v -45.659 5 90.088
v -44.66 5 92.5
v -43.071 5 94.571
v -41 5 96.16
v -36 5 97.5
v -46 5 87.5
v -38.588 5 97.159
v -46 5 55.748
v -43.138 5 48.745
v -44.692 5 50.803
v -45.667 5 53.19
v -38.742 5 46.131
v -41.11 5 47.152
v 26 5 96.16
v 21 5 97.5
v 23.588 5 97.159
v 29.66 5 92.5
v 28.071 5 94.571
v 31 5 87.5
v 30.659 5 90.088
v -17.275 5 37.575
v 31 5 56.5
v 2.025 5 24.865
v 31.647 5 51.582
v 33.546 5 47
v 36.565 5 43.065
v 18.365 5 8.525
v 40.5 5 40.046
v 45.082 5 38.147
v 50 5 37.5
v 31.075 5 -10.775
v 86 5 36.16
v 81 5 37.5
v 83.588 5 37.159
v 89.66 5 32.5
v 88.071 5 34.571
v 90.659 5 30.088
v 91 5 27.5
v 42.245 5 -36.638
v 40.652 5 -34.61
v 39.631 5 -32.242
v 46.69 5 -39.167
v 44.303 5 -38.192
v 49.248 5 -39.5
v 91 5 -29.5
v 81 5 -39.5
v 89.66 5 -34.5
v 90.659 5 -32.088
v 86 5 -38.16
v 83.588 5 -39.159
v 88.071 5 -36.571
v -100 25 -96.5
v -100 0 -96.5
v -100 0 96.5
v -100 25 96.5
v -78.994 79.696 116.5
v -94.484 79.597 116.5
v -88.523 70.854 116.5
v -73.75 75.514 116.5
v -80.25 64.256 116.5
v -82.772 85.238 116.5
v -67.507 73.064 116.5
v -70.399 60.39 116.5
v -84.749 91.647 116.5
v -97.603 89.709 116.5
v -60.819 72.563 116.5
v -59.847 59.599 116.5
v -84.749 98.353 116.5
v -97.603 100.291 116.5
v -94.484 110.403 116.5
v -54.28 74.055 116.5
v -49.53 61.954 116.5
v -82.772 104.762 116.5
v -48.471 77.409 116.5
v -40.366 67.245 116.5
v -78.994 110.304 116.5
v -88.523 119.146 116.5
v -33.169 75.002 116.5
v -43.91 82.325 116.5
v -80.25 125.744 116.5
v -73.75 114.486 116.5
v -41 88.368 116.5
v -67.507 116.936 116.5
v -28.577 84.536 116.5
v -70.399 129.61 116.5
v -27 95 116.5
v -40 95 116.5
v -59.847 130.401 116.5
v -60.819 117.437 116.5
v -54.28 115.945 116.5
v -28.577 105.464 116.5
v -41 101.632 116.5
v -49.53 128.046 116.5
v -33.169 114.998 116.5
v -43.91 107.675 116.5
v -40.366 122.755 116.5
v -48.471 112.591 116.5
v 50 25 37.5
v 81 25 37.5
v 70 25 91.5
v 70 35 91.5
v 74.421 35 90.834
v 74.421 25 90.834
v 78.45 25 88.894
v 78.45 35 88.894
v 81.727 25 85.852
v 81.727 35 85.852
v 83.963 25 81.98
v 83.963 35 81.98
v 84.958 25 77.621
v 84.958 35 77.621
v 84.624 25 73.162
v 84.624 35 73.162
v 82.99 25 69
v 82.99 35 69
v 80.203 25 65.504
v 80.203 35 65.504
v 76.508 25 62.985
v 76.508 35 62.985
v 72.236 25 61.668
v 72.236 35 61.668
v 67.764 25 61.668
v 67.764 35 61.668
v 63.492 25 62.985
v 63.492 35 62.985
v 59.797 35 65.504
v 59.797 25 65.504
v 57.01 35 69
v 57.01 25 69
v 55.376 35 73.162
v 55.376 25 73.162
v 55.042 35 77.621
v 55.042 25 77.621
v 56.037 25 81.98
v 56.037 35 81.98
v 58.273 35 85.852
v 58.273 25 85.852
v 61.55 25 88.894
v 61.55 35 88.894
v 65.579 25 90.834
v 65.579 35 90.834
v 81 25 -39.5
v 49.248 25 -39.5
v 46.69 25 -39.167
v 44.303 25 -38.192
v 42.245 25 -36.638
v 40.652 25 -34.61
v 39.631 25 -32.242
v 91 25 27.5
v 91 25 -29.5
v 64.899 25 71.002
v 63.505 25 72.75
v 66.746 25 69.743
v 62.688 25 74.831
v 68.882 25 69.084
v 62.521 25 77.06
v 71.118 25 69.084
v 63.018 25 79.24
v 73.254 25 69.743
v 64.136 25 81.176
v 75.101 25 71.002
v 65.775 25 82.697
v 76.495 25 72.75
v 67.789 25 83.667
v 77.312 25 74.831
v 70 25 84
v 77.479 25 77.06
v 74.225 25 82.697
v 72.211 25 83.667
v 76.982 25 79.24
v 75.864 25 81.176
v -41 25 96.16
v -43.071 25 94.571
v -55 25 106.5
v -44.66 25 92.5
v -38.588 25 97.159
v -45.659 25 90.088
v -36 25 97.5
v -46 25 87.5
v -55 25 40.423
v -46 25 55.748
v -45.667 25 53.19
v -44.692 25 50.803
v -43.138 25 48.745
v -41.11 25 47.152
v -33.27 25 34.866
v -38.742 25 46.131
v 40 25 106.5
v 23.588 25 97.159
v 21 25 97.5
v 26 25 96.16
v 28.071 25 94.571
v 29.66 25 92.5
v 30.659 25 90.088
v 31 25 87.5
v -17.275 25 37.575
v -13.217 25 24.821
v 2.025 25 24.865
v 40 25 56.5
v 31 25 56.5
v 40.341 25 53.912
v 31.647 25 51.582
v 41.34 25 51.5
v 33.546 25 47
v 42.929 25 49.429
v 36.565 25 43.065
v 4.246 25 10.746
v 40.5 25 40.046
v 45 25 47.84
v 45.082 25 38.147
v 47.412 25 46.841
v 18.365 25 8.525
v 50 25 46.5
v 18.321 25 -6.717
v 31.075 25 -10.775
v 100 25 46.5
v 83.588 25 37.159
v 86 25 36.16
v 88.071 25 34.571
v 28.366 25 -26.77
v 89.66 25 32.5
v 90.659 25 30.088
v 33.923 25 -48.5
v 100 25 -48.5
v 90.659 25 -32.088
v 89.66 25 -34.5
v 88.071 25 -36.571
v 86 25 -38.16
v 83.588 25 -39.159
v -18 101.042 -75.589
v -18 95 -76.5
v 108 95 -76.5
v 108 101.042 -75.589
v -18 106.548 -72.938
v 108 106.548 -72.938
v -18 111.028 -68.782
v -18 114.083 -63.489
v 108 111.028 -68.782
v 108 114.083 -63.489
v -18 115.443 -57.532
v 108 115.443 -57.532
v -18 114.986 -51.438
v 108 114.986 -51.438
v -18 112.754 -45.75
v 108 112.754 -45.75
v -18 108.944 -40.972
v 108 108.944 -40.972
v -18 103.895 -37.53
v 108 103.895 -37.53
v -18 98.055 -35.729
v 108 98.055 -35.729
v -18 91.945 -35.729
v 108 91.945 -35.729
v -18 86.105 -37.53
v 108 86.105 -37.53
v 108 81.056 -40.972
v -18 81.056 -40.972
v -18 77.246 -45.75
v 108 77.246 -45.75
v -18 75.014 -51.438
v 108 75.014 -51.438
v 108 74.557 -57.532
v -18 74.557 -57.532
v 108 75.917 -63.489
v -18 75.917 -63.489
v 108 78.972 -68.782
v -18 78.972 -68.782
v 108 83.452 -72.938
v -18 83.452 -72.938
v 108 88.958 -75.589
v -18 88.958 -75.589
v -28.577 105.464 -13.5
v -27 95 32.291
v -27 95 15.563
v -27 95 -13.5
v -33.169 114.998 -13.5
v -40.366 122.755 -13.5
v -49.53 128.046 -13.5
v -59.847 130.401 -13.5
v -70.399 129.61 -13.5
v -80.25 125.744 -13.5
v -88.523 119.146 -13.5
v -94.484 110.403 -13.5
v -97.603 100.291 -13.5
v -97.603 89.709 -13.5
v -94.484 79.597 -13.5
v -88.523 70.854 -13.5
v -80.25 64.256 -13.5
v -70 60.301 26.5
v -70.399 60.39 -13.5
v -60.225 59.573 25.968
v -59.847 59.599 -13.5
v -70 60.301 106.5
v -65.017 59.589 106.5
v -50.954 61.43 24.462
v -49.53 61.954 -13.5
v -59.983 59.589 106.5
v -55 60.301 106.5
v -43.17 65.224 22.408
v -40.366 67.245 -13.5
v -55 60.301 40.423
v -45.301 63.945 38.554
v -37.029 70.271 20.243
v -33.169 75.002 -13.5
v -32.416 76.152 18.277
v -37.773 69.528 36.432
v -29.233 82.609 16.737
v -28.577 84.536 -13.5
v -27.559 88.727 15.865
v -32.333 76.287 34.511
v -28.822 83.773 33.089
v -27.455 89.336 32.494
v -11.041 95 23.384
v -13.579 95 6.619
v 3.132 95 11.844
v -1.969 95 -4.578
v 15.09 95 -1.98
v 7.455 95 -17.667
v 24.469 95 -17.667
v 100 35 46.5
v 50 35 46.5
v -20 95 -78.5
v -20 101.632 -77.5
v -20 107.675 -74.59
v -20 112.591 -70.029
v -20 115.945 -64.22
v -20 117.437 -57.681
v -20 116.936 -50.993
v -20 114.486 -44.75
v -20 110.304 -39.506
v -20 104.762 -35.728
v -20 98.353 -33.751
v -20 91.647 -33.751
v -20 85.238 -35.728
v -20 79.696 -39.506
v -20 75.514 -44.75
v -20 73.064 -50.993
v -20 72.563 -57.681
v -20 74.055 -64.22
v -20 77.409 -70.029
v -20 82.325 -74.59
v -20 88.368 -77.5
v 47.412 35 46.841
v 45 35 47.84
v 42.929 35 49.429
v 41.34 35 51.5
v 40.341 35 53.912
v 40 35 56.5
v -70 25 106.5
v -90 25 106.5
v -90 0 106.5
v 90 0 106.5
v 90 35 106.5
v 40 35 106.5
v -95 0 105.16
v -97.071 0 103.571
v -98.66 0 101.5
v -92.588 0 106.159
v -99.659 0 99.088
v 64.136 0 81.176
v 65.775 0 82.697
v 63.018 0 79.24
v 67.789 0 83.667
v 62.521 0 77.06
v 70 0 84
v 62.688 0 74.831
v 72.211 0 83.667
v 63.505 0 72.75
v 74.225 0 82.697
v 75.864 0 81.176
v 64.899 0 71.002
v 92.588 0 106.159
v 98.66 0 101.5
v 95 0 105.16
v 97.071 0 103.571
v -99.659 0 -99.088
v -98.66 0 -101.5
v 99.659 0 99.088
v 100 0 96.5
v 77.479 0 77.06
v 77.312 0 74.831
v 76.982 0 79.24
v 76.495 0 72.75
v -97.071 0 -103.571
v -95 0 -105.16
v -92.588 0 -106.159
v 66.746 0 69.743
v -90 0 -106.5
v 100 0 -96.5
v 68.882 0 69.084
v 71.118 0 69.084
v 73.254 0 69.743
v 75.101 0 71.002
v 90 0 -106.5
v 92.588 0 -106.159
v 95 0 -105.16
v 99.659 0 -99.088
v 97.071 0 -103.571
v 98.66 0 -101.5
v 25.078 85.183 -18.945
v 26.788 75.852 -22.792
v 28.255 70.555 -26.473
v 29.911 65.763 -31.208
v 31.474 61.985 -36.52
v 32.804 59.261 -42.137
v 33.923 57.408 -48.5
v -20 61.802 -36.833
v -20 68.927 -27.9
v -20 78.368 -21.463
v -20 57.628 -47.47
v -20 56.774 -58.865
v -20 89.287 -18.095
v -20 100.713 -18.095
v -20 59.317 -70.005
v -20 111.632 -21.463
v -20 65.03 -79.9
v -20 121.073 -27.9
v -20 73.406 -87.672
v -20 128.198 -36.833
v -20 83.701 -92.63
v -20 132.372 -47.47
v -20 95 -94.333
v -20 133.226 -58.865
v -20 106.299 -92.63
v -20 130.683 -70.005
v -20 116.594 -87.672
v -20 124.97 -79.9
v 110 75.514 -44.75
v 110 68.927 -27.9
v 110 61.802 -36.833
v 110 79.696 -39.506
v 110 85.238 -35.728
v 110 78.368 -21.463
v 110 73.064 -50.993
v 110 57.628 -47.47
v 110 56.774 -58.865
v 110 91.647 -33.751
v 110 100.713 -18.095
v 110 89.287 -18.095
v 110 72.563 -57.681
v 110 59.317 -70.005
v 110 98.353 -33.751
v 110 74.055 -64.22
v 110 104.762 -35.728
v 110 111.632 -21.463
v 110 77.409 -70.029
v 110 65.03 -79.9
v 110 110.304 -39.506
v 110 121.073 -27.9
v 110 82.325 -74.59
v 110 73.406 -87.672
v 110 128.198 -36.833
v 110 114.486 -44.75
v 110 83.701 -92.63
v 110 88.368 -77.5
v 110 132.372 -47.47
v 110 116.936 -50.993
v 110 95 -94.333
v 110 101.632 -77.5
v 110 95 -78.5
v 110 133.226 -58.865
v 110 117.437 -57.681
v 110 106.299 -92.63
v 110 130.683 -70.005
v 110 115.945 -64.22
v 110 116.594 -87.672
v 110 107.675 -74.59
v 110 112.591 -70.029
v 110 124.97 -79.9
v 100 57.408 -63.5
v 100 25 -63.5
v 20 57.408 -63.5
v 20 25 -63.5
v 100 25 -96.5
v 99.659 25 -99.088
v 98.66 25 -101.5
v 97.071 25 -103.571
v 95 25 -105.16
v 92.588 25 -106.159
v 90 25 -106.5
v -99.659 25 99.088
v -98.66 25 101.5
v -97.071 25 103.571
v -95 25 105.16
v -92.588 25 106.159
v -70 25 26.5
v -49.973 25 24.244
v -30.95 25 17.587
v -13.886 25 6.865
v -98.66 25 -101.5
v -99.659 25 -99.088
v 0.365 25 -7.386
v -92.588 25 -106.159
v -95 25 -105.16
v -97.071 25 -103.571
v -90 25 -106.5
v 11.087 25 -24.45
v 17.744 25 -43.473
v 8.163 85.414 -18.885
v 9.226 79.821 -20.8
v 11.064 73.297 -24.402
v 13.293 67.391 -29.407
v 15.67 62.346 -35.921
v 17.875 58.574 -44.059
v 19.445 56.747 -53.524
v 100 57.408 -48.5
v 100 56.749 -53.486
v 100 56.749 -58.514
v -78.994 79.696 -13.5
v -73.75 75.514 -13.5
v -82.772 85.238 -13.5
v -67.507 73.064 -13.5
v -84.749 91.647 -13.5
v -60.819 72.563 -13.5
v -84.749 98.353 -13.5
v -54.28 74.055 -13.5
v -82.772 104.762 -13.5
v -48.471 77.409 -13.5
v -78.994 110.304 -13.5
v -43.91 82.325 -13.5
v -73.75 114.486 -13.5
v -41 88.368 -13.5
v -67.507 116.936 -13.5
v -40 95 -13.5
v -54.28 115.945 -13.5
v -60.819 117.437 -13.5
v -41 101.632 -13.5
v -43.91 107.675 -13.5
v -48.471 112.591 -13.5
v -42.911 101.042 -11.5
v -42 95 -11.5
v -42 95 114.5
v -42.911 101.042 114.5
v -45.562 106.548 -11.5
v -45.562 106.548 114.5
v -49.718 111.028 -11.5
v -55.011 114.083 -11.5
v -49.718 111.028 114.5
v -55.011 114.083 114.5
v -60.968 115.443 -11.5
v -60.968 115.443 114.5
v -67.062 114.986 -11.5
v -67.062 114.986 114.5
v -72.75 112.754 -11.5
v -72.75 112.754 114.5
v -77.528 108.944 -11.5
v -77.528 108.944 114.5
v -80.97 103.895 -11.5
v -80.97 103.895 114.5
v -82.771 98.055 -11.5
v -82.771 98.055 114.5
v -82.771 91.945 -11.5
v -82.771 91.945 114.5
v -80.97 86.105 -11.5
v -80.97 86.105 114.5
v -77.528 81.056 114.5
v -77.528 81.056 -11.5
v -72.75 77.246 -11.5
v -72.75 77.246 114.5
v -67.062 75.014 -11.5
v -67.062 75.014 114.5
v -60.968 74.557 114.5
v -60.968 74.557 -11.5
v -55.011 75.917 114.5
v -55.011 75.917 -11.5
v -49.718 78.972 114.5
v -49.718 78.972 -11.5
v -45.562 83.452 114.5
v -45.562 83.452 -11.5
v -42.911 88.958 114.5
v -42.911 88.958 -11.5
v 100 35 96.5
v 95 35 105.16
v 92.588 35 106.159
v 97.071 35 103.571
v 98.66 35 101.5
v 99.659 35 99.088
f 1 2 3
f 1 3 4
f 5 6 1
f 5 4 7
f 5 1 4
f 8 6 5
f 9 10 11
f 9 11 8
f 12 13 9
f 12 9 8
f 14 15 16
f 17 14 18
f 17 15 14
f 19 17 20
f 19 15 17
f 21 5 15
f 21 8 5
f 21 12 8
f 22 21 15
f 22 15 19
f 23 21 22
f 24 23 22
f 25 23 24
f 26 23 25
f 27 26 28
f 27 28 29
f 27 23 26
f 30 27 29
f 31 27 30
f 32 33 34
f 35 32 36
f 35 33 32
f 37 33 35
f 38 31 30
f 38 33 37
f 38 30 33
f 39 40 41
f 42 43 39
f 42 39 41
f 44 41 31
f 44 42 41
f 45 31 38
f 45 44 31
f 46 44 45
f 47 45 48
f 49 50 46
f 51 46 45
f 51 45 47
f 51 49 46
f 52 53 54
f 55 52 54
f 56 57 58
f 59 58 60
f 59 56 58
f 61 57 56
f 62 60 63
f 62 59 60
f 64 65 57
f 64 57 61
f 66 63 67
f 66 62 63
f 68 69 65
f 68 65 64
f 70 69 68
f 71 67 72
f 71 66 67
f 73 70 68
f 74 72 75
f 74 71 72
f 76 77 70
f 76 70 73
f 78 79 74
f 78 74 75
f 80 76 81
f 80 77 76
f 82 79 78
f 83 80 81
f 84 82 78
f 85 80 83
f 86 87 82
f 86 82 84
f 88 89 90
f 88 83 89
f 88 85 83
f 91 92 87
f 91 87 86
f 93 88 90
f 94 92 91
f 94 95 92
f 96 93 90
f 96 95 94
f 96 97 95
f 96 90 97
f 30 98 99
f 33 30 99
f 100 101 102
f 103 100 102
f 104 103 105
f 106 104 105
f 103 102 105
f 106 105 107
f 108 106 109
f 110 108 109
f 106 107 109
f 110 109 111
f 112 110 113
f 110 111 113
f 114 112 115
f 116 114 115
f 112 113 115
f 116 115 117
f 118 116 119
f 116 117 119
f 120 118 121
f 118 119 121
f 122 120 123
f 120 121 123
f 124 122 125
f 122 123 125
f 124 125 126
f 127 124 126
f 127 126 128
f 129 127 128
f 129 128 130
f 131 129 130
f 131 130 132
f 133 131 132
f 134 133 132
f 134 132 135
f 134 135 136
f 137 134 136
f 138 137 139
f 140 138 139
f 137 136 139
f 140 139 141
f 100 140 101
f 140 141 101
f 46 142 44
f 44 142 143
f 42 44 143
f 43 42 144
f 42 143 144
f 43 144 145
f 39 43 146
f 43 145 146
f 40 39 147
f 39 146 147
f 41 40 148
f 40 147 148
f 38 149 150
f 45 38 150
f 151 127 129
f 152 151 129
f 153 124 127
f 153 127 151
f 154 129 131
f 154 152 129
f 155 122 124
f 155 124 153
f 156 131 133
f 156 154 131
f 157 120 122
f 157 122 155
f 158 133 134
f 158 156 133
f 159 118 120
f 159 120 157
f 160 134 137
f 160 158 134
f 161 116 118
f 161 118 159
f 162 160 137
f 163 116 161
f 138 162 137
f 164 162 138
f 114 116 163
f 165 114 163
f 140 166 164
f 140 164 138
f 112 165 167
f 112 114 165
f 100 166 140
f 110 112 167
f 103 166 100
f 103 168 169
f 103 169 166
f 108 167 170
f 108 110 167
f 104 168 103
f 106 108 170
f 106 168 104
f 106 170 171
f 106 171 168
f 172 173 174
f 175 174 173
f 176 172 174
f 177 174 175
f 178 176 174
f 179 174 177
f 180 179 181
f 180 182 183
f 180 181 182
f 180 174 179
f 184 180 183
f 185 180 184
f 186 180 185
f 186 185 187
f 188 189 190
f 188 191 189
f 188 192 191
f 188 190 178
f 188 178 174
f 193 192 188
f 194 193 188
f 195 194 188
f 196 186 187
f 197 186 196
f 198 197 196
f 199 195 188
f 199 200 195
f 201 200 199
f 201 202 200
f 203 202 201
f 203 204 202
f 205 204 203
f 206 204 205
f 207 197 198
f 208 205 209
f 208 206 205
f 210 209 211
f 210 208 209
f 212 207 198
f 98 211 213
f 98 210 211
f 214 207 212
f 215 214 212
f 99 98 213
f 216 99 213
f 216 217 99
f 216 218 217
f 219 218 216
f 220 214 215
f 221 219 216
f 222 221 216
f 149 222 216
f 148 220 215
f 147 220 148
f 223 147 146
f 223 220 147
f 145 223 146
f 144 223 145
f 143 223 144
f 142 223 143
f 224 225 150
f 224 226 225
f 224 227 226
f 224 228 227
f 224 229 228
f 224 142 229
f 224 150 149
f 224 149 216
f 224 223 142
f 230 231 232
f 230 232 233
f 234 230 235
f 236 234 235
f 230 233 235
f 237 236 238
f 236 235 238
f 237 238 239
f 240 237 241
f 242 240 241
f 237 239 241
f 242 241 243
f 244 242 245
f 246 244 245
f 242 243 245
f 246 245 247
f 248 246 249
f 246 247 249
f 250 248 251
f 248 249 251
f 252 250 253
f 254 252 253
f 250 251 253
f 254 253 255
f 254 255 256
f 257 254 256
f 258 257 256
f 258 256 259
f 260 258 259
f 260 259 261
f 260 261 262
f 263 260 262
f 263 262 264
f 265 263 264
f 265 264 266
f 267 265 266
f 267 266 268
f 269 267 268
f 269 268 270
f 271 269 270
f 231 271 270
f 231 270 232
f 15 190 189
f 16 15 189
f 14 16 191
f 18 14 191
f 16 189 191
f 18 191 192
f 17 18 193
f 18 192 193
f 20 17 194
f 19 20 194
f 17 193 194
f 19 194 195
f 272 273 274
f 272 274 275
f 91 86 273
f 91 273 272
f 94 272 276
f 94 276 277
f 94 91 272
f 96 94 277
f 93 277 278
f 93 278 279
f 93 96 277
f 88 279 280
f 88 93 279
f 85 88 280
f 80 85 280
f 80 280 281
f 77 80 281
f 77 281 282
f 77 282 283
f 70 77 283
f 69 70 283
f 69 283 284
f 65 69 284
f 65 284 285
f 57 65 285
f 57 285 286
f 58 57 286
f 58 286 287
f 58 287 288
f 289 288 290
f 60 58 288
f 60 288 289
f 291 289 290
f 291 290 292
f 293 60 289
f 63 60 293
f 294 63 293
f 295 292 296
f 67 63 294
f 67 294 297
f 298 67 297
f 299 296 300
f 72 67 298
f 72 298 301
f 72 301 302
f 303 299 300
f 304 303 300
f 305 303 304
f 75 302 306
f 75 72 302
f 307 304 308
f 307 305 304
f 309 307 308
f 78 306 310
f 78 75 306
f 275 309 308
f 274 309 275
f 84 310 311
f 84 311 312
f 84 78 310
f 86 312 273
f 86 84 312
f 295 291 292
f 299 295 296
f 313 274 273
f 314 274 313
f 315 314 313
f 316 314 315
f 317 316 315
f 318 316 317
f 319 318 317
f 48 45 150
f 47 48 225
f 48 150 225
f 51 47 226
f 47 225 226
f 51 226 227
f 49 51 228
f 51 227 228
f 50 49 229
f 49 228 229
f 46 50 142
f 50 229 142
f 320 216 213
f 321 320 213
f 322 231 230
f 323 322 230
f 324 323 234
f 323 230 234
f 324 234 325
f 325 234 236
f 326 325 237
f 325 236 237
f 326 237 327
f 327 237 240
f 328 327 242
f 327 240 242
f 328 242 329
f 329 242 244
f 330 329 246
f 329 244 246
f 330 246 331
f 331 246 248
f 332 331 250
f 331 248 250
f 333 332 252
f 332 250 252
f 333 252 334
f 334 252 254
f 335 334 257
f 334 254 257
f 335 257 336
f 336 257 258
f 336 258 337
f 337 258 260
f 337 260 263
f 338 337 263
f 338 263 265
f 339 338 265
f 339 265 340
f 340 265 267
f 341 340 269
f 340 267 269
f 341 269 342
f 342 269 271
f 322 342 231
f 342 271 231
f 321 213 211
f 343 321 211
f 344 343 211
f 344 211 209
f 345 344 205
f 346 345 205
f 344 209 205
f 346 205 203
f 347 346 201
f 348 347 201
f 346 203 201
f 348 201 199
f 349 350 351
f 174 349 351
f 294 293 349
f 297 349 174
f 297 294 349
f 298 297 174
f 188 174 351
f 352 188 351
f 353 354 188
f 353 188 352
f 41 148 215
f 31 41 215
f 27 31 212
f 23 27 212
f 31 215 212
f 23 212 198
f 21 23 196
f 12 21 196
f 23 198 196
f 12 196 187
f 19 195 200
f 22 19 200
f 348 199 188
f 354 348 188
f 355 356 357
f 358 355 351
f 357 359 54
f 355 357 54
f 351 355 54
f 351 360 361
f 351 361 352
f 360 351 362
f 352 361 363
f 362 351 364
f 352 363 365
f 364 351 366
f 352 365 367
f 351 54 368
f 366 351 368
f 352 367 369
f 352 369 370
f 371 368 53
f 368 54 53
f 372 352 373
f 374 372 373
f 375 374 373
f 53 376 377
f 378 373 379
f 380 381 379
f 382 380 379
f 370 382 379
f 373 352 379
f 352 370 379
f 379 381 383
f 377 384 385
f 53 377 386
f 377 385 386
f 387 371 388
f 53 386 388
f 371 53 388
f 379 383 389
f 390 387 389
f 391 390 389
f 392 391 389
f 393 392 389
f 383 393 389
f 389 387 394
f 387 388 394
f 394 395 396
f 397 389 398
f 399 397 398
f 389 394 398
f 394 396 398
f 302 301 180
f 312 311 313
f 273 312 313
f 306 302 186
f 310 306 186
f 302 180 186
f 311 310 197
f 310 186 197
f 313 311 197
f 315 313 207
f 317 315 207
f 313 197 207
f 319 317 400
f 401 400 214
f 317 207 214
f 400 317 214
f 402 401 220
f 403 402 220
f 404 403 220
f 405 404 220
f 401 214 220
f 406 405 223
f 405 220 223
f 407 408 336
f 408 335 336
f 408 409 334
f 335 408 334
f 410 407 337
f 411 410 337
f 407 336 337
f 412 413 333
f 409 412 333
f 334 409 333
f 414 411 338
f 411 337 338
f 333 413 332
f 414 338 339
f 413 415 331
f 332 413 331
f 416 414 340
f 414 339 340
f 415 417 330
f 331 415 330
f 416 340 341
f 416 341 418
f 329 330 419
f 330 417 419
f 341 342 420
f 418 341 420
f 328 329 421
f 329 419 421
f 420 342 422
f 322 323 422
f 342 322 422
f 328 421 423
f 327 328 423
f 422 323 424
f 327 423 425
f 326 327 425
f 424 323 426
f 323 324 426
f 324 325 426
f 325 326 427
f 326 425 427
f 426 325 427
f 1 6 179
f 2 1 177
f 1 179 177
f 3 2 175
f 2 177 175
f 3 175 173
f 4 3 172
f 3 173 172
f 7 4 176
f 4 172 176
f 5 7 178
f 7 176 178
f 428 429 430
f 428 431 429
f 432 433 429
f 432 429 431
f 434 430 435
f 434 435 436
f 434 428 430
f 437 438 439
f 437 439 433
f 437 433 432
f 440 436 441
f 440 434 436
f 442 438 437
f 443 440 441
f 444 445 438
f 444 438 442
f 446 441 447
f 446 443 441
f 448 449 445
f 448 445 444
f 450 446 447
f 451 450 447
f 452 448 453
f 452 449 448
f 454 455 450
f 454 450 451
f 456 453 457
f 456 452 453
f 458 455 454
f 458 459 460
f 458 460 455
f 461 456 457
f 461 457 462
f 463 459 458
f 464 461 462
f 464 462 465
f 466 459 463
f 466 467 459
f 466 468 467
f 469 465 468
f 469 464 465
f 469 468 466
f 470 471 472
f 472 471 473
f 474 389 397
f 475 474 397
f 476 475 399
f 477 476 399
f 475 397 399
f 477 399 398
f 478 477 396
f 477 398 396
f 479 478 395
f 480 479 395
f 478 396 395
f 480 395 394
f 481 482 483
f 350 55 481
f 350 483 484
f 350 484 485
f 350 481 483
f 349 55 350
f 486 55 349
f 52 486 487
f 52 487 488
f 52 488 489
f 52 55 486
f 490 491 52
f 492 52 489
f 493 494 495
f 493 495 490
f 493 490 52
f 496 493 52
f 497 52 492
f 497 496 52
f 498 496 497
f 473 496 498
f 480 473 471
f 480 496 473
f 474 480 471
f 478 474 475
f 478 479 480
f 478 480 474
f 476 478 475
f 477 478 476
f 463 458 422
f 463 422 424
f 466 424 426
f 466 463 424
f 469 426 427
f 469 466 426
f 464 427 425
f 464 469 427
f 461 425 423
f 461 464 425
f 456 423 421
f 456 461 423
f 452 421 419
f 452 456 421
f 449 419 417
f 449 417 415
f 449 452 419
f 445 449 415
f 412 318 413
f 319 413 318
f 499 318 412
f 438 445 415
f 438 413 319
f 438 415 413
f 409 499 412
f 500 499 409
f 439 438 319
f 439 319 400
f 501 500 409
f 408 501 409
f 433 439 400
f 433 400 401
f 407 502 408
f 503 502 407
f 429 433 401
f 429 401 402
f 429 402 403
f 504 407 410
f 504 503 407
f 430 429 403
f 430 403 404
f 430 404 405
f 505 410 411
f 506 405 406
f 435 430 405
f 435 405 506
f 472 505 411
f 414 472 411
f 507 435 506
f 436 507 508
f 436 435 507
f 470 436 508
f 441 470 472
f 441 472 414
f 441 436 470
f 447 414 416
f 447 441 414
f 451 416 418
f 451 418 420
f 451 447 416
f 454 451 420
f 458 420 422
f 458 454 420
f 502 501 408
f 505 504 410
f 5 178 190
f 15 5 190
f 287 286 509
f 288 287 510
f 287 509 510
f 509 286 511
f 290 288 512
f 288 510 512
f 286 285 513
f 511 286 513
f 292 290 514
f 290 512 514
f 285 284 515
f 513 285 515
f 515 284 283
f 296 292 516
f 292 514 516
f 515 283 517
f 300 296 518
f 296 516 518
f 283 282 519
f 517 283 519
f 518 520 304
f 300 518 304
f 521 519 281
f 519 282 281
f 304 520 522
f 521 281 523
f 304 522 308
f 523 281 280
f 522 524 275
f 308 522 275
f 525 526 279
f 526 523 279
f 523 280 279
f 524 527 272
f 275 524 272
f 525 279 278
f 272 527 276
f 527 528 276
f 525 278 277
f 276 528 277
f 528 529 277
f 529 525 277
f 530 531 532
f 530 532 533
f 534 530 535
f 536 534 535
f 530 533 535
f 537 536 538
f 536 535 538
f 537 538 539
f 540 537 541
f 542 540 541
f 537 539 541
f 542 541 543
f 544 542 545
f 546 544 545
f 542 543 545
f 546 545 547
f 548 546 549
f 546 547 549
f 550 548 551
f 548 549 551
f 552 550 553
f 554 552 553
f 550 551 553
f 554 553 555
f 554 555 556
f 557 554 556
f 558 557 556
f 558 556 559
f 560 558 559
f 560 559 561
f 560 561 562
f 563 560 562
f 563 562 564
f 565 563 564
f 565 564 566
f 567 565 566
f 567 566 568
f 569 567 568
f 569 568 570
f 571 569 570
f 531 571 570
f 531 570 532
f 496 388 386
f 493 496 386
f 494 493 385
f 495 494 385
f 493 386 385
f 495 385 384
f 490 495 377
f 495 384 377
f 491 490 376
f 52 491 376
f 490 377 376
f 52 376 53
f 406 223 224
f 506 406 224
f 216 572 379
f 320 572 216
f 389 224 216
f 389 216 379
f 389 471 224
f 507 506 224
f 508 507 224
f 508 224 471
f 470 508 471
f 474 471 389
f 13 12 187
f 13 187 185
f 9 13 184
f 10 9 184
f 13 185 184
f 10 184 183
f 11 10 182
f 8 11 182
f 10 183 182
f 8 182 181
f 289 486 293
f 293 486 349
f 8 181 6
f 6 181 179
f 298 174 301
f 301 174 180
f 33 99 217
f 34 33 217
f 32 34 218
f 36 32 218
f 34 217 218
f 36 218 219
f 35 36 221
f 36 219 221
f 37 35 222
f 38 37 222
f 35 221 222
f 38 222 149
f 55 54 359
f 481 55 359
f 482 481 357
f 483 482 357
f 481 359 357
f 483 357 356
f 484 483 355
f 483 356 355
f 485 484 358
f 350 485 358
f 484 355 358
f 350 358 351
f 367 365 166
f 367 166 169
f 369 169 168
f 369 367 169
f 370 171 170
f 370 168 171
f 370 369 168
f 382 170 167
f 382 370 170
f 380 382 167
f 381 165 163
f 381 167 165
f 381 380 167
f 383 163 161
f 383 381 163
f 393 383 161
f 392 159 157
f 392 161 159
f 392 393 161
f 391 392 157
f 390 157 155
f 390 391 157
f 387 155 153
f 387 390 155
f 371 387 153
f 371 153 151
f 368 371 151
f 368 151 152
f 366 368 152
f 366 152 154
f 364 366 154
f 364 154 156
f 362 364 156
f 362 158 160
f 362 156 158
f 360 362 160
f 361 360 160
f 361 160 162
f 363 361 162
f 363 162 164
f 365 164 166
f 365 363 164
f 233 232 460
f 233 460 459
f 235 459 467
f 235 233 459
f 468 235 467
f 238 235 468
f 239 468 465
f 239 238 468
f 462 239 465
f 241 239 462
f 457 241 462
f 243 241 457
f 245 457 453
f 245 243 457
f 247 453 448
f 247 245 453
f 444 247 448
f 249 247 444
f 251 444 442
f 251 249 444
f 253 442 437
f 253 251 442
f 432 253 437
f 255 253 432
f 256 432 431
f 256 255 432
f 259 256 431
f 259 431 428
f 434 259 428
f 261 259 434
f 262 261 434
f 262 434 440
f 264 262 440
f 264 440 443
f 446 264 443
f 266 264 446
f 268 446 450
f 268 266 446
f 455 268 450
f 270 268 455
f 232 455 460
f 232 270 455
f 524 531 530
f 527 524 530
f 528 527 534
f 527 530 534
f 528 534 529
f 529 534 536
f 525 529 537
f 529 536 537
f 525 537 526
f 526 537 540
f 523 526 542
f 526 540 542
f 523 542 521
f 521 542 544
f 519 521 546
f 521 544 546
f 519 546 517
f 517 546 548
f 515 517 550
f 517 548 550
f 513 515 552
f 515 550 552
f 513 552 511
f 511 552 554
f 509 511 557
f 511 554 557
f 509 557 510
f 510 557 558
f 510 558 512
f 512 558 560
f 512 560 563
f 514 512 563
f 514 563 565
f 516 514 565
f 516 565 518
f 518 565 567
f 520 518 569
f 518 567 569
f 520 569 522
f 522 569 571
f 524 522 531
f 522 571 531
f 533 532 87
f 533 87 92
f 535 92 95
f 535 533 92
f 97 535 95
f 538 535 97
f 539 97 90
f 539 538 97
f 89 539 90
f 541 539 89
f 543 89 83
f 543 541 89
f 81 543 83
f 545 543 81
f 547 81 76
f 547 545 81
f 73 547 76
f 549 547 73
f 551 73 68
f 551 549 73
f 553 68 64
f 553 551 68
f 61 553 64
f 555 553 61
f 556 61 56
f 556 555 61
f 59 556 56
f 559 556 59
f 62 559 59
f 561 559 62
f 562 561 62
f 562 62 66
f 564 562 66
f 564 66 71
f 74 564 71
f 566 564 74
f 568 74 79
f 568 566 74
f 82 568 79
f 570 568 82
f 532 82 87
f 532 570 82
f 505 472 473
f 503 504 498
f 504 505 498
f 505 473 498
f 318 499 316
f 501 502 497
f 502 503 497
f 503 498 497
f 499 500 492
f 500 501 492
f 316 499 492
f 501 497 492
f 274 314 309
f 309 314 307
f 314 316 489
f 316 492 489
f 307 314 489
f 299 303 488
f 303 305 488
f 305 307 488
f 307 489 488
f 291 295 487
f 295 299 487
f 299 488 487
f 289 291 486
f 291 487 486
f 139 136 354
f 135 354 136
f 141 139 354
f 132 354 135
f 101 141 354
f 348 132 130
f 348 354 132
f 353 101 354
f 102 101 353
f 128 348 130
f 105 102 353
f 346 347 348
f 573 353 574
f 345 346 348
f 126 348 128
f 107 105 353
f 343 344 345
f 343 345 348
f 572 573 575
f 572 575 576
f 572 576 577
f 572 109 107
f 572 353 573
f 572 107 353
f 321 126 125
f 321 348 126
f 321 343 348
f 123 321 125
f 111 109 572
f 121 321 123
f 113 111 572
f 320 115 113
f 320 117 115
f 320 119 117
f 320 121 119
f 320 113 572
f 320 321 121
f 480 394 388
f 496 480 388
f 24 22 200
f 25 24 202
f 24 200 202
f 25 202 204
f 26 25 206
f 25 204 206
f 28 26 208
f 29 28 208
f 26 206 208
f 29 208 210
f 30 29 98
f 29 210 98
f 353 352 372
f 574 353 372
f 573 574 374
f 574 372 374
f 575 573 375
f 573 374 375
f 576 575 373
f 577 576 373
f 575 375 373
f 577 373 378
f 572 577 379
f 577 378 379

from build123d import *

# Parameters (mm, degrees)
BOSS_EXTRUDE1_DEPTH     = 95
BOSS_EXTRUDE2_DEPTH     = 25
BOSS_EXTRUDE3_DEPTH     = 35
CUT_EXTRUDE1_DEPTH      = 20
SKETCH4_R               = 38.333333333
SKETCH4_R_2             = 20.5
BOSS_EXTRUDE4_DEPTH     = 120
SKETCH5_R               = 35.5
SKETCH5_R_2             = 20.5
BOSS_EXTRUDE5_DEPTH     = 120
BOSS_EXTRUDE6_START     = 10
SKETCH6_R               = 35.5
SKETCH6_R_2             = 20.5
BOSS_EXTRUDE6_DEPTH     = 10
BOSS_EXTRUDE7_START     = 10
SKETCH7_R               = 38.333333333
SKETCH7_R_2             = 20.5
BOSS_EXTRUDE7_DEPTH     = 10
SKETCH8_R               = 20.5
CUT_EXTRUDE2_DEPTH      = 283.146731022
SKETCH9_R               = 20.5
CUT_EXTRUDE3_DEPTH      = 275.681684551
SKETCH10_R              = 15
CUT_EXTRUDE4_DEPTH      = 10
CUT_EXTRUDE5_DEPTH      = 194.412412161
CUT_EXTRUDE5_DEPTH_BACK = 194.412412161
SKETCH11_R              = 7.5
CHAMFER1_SIZE           = 2


with BuildPart() as part:
    # Sketch1 → Boss-Extrude1 (new body)
    with BuildSketch(Plane(origin=(0, 0, 0), x_dir=(1, 0, 0), z_dir=(0, 1, 0))):
        with BuildLine():
            Line((-70, -26.5), (-70, -106.5))
            Line((-70, -106.5), (-55, -106.5))
            Line((-55, -106.5), (-55, -40.423048454))
            ThreePointArc((-55, -40.423048454), (4.246212025, -10.746212025), (33.923048454, 48.5))
            Line((33.923048454, 48.5), (100, 48.5))
            Line((100, 48.5), (100, 63.5))
            Line((100, 63.5), (20, 63.5))
            ThreePointArc((20, 63.5), (-6.360389693, -0.139610307), (-70, -26.5))
        make_face()
    extrude(amount=BOSS_EXTRUDE1_DEPTH)

    # Sketch1<3> → Boss-Extrude2 (add)
    with BuildSketch(Plane(origin=(0, 0, 0), x_dir=(1, 0, 0), z_dir=(0, 1, 0))):
        with BuildLine():
            Line((-90, -106.5), (-70, -106.5))
            Line((-70, -106.5), (-70, -26.5))
            ThreePointArc((-70, -26.5), (-6.360389693, -0.139610307), (20, 63.5))
            Line((20, 63.5), (100, 63.5))
            Line((100, 63.5), (100, 96.5))
            ThreePointArc((100, 96.5), (97.071067812, 103.571067812), (90, 106.5))
            Line((90, 106.5), (-90, 106.5))
            ThreePointArc((-90, 106.5), (-97.071067812, 103.571067812), (-100, 96.5))
            Line((-100, 96.5), (-100, -96.5))
            ThreePointArc((-100, -96.5), (-97.071067812, -103.571067812), (-90, -106.5))
        make_face()
        with BuildLine():
            Line((-55, -40.423048454), (-55, -106.5))
            Line((-55, -106.5), (40, -106.5))
            Line((40, -106.5), (40, -56.5))
            ThreePointArc((40, -56.5), (42.928932188, -49.428932188), (50, -46.5))
            Line((50, -46.5), (100, -46.5))
            Line((100, -46.5), (100, 48.5))
            Line((100, 48.5), (33.923048454, 48.5))
            ThreePointArc((33.923048454, 48.5), (4.246212025, -10.746212025), (-55, -40.423048454))
        make_face()
    extrude(amount=BOSS_EXTRUDE2_DEPTH)

    # Sketch1<4> → Boss-Extrude3 (add)
    with BuildSketch(Plane(origin=(0, 0, 0), x_dir=(1, 0, 0), z_dir=(0, 1, 0))):
        with BuildLine():
            Line((40, -56.5), (40, -106.5))
            Line((40, -106.5), (90, -106.5))
            ThreePointArc((90, -106.5), (97.071067812, -103.571067812), (100, -96.5))
            Line((100, -96.5), (100, -46.5))
            Line((100, -46.5), (50, -46.5))
            ThreePointArc((50, -46.5), (42.928932188, -49.428932188), (40, -56.5))
        make_face()
    extrude(amount=BOSS_EXTRUDE3_DEPTH)

    # Sketch2 → Cut-Extrude1 (cut)
    with BuildSketch(Plane(origin=(0, 25, 0), x_dir=(1, 0, 0), z_dir=(0, 1, 0))):
        with BuildLine():
            Line((81, 39.5), (49.247641486, 39.5))
            ThreePointArc((49.247641486, 39.5), (43.223496519, 37.481834214), (39.630896205, 32.241935484))
            ThreePointArc((39.630896205, 32.241935484), (10.610173055, -17.110173055), (-38.741935484, -46.130896205))
            ThreePointArc((-38.741935484, -46.130896205), (-43.981834214, -49.723496519), (-46, -55.747641486))
            Line((-46, -55.747641486), (-46, -87.5))
            ThreePointArc((-46, -87.5), (-43.071067812, -94.571067812), (-36, -97.5))
            Line((-36, -97.5), (21, -97.5))
            ThreePointArc((21, -97.5), (28.071067812, -94.571067812), (31, -87.5))
            Line((31, -87.5), (31, -56.5))
            ThreePointArc((31, -56.5), (36.564971157, -43.064971157), (50, -37.5))
            Line((50, -37.5), (81, -37.5))
            ThreePointArc((81, -37.5), (88.071067812, -34.571067812), (91, -27.5))
            Line((91, -27.5), (91, 29.5))
            ThreePointArc((91, 29.5), (88.071067812, 36.571067812), (81, 39.5))
        make_face()
    extrude(amount=-CUT_EXTRUDE1_DEPTH, mode=Mode.SUBTRACT)

    # Sketch4 → Boss-Extrude4 (add)
    with BuildSketch(Plane(origin=(100, 0, 0), x_dir=(0, 0, -1), z_dir=(1, 0, 0))):
        with Locations((56, 95)):
            Circle(SKETCH4_R)
        with Locations((56, 95)):
            Circle(SKETCH4_R_2, mode=Mode.SUBTRACT)
    extrude(amount=-BOSS_EXTRUDE4_DEPTH)

    # Sketch5 → Boss-Extrude5 (add)
    with BuildSketch(Plane.XY.offset(106.5)):
        with Locations((-62.5, 95)):
            Circle(SKETCH5_R)
        with Locations((-62.5, 95)):
            Circle(SKETCH5_R_2, mode=Mode.SUBTRACT)
    extrude(amount=-BOSS_EXTRUDE5_DEPTH)

    # Sketch6 → Boss-Extrude6 (add)
    with BuildSketch(Plane.XY.offset(106.5).offset(BOSS_EXTRUDE6_START)):
        with Locations((-62.5, 95)):
            Circle(SKETCH6_R)
        with Locations((-62.5, 95)):
            Circle(SKETCH6_R_2, mode=Mode.SUBTRACT)
    extrude(amount=-BOSS_EXTRUDE6_DEPTH)

    # Sketch7 → Boss-Extrude7 (add)
    with BuildSketch(Plane(origin=(100, 0, 0), x_dir=(0, 0, -1), z_dir=(1, 0, 0)).offset(BOSS_EXTRUDE7_START)):
        with Locations((56, 95)):
            Circle(SKETCH7_R)
        with Locations((56, 95)):
            Circle(SKETCH7_R_2, mode=Mode.SUBTRACT)
    extrude(amount=-BOSS_EXTRUDE7_DEPTH)

    # Sketch8 → Cut-Extrude2 (cut, through all)
    with BuildSketch(Plane.XY.offset(116.5)):
        with Locations((-62.5, 95)):
            Circle(SKETCH8_R)
    extrude(amount=-CUT_EXTRUDE2_DEPTH, mode=Mode.SUBTRACT)

    # Sketch9 → Cut-Extrude3 (cut, through all)
    with BuildSketch(Plane(origin=(110, 0, 0), x_dir=(0, 0, -1), z_dir=(1, 0, 0))):
        with Locations((56, 95)):
            Circle(SKETCH9_R)
    extrude(amount=-CUT_EXTRUDE3_DEPTH, mode=Mode.SUBTRACT)

    # Sketch10 → Cut-Extrude4 (cut)
    with BuildSketch(Plane(origin=(0, 35, 0), x_dir=(1, 0, 0), z_dir=(0, 1, 0))):
        with Locations((70, -76.5)):
            Circle(SKETCH10_R)
    extrude(amount=-CUT_EXTRUDE4_DEPTH, mode=Mode.SUBTRACT)

    # Sketch11 → Cut-Extrude5 (cut, two sides: drawn at the far end of the back side and taken through both)
    with BuildSketch(Plane(origin=(0, 25, 0), x_dir=(1, 0, 0), z_dir=(0, 1, 0)).offset(-CUT_EXTRUDE5_DEPTH_BACK)):
        with Locations((70, -76.5)):
            Circle(SKETCH11_R)
    extrude(amount=CUT_EXTRUDE5_DEPTH + CUT_EXTRUDE5_DEPTH_BACK, mode=Mode.SUBTRACT)

    # Chamfer1
    chamfer1_edges = [part.edges().sort_by_distance(p)[0] for p in [
        (110, 95, -35.5),
        (-20, 95, -35.5),
        (-83, 95, -13.5),
        (-83, 95, 116.5),
    ]]
    chamfer(chamfer1_edges, length=CHAMFER1_SIZE)


solid = part.part
